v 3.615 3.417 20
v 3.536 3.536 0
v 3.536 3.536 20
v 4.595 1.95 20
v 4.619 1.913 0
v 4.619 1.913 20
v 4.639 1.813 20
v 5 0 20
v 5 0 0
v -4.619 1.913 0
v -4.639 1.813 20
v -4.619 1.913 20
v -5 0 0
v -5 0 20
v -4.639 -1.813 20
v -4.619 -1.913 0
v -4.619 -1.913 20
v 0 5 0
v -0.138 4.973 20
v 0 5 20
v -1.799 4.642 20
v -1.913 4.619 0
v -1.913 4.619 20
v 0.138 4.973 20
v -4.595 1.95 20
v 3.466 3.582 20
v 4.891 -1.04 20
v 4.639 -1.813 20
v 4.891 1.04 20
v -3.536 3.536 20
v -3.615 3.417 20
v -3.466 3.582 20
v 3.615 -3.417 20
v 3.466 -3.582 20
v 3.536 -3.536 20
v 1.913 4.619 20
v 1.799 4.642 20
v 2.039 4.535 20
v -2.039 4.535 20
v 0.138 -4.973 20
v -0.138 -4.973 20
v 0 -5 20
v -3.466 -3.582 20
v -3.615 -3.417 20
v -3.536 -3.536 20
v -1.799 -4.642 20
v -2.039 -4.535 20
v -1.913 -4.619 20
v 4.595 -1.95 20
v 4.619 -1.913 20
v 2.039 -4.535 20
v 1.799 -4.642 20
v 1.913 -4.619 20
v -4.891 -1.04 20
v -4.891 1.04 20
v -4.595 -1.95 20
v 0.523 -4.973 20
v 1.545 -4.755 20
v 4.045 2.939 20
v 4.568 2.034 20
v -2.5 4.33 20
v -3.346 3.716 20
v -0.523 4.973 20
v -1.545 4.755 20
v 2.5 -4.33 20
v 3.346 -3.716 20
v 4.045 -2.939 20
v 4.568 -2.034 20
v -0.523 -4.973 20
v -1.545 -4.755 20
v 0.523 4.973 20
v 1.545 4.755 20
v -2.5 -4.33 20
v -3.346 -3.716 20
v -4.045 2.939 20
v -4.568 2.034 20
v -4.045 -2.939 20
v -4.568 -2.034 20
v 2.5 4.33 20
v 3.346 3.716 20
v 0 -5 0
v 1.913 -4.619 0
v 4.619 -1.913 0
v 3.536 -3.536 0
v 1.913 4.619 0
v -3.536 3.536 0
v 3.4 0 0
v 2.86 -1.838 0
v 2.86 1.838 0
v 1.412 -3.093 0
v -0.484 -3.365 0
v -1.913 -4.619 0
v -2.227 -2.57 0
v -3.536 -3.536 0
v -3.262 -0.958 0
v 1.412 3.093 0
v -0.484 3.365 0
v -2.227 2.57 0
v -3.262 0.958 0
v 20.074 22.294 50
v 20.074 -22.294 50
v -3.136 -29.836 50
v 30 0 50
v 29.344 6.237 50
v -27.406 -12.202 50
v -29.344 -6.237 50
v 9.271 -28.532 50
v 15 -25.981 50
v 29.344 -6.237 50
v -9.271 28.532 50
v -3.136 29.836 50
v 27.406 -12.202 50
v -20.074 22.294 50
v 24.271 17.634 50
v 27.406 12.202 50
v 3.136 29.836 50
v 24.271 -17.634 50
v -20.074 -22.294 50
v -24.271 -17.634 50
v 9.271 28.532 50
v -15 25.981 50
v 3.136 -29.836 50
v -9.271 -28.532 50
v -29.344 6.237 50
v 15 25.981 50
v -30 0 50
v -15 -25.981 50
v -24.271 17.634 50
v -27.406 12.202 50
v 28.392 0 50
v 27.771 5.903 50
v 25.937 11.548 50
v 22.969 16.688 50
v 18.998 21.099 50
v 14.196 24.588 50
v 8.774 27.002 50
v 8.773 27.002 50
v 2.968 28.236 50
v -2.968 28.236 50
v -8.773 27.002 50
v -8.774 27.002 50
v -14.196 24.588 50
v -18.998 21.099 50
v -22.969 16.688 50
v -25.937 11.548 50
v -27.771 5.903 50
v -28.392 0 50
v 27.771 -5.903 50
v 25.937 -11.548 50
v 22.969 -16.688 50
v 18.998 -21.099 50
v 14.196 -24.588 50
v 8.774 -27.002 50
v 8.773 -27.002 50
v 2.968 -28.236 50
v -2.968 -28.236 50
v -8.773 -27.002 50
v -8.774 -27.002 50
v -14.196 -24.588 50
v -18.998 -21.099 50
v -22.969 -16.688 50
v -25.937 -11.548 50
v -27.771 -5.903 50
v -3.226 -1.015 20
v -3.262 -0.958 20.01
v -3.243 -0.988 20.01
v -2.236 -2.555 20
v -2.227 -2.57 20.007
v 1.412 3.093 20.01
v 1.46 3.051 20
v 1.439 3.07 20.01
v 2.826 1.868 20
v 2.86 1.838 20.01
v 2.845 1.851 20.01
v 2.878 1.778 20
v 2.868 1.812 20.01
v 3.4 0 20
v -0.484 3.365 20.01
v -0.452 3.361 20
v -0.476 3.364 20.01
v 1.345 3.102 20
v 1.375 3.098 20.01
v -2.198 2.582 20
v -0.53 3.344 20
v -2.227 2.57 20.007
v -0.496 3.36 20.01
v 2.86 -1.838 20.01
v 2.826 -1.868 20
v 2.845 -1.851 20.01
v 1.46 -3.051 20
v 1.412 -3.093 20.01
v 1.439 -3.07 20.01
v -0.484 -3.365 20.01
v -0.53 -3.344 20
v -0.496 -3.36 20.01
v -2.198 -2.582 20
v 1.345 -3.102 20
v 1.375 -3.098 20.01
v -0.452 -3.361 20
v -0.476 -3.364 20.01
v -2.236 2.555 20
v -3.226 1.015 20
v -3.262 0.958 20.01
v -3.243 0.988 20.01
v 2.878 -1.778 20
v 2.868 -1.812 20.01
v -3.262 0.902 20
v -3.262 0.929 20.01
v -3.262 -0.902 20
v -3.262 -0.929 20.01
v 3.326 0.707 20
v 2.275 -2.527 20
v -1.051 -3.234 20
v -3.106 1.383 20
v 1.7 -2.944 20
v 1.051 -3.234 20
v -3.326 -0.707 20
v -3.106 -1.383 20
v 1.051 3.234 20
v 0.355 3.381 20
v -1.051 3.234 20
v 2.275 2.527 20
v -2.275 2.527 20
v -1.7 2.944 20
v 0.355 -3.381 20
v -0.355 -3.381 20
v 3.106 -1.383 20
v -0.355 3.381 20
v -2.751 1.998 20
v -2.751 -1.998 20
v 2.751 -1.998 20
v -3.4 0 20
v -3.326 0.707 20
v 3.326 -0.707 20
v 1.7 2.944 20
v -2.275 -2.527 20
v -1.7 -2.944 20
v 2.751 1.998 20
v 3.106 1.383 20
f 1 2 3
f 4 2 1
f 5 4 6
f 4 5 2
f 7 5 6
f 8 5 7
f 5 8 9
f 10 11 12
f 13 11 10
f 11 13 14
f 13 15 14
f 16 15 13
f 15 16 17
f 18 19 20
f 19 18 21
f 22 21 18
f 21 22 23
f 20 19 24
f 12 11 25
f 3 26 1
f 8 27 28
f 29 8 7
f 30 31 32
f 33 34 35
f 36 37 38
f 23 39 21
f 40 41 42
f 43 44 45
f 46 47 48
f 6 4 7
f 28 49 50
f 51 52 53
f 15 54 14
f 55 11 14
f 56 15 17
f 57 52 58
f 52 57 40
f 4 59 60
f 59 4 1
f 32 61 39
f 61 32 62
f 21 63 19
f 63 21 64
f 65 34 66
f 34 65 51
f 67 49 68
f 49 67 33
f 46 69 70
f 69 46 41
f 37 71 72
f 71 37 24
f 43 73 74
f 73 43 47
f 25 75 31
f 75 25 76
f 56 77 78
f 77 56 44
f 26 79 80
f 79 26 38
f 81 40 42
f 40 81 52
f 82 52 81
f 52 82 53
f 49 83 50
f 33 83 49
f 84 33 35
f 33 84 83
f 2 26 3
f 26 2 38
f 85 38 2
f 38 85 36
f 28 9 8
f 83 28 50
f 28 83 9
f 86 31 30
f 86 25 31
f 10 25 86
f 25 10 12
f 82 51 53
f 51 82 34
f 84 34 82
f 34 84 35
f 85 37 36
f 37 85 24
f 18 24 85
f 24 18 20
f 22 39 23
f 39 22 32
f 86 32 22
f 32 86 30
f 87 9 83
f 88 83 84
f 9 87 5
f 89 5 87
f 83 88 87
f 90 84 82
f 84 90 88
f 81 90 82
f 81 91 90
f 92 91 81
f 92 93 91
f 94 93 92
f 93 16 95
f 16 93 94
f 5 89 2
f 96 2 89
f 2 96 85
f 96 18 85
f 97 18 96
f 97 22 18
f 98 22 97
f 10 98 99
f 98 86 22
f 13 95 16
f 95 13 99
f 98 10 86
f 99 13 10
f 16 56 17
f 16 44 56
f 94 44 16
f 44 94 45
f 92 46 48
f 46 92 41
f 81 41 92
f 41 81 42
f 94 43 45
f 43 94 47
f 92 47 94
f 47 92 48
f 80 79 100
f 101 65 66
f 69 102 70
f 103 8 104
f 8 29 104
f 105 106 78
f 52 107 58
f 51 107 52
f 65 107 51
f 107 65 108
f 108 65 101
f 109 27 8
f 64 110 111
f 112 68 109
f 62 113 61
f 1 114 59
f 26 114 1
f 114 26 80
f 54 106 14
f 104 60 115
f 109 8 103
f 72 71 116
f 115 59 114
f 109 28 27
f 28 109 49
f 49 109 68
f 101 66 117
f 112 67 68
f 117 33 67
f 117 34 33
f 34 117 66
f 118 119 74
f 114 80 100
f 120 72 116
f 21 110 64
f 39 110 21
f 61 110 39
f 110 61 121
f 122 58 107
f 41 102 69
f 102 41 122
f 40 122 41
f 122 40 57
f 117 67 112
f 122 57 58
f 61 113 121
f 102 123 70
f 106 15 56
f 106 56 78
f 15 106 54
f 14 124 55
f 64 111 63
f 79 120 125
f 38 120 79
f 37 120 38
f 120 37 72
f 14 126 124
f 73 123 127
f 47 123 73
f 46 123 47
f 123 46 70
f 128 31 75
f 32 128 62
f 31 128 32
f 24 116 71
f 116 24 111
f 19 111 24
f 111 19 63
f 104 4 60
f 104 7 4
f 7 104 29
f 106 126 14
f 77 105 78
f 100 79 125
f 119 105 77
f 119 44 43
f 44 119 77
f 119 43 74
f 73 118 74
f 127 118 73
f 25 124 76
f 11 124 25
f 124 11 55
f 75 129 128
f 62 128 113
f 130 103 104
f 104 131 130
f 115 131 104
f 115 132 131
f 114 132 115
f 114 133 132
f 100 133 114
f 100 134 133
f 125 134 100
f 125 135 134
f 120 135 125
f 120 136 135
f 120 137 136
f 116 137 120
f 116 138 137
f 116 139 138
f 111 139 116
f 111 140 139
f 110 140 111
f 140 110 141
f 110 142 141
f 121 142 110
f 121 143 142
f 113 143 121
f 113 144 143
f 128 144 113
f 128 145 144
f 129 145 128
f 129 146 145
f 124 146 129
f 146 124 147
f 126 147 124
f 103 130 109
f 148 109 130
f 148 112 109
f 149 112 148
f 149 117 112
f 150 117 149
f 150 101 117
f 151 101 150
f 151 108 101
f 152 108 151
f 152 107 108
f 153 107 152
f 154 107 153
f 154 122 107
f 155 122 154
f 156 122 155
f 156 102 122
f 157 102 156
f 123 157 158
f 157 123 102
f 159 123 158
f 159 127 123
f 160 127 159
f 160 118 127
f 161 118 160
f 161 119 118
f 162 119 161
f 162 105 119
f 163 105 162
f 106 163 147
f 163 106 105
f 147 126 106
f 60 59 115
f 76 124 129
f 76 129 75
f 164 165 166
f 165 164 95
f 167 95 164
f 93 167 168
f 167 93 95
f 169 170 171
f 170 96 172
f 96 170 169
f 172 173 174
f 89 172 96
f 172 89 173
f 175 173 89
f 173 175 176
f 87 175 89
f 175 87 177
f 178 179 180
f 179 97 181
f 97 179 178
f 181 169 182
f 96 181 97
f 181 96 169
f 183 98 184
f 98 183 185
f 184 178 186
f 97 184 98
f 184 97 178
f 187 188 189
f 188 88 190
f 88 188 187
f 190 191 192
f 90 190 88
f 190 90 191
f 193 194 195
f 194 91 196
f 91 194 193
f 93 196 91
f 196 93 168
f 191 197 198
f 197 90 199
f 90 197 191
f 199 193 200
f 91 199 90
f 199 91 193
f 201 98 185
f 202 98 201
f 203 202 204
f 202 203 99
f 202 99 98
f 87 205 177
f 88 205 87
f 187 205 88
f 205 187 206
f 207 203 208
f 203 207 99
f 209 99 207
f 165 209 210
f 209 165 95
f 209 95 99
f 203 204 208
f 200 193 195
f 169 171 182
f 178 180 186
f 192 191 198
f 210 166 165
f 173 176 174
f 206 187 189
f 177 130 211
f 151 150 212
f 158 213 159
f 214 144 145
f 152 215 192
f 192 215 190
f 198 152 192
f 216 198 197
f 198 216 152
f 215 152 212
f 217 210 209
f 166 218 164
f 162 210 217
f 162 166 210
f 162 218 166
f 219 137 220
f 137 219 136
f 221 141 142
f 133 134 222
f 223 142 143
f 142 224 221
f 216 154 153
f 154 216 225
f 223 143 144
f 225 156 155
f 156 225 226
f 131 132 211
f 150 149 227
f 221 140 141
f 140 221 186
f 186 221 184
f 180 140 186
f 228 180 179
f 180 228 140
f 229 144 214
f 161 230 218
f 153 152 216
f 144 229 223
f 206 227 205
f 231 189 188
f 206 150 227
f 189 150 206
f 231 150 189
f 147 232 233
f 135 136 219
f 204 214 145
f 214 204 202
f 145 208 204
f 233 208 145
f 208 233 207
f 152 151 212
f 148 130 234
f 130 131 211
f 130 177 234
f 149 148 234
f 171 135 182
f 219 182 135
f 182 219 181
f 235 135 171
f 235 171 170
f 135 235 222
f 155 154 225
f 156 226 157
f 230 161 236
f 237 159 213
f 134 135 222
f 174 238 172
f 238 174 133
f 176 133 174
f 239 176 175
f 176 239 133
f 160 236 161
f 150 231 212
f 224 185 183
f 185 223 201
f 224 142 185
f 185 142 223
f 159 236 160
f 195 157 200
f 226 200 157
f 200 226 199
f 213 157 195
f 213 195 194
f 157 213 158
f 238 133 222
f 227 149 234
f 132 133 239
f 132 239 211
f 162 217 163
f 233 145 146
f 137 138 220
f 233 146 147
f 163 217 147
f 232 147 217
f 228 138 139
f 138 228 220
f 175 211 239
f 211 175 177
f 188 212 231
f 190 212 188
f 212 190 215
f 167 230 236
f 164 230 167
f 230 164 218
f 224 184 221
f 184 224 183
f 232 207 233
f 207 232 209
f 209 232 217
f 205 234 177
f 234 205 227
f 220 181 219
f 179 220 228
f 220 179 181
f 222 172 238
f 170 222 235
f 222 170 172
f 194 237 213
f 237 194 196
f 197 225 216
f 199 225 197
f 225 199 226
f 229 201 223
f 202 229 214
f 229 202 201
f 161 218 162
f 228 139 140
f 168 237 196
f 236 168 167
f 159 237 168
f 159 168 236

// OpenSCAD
// Lab funnel - printed upright (spout down, wide opening up)
// Dimensions measured with calipers

// Overall height
H_FUNNEL = 50;

// Spout dimensions
H_SPOUT = 20;
OD_SPOUT = 10;

// Cone (funnel body) dimensions
OD_RIM = 60;
H_CONE = H_FUNNEL - H_SPOUT; // 30 mm

// Wall thickness
T_WALL = 1.6;

// Derived dimensions
ID_SPOUT = OD_SPOUT - 2 * T_WALL; // 6.8 mm bore
ID_RIM = OD_RIM - 2 * T_WALL;     // 56.8 mm inner rim diameter

// Print orientation: rests on XY plane at z=0, builds upward

// Outer shape: spout cylinder + cone
difference() {
    // Outer solid (spout + cone)
    union() {
        // Spout cylinder
        cylinder(h = H_SPOUT, d = OD_SPOUT, center = false);
        
        // Cone: bottom at z=H_SPOUT, top at z=H_FUNNEL
        // Use translate to position the cone
        translate([0, 0, H_SPOUT]) {
            cylinder(h = H_CONE, d1 = OD_SPOUT, d2 = OD_RIM, center = false);
        }
    }
    
    // Inner bore (spout + cone) - extend slightly past faces
    union() {
        // Spout bore
        cylinder(h = H_SPOUT + 0.01, d = ID_SPOUT, center = false);
        
        // Cone bore: extends from z=H_SPOUT to z=H_FUNNEL+0.01
        translate([0, 0, H_SPOUT]) {
            cylinder(h = H_CONE + 0.01, d1 = ID_SPOUT, d2 = ID_RIM, center = false);
        }
    }
}
